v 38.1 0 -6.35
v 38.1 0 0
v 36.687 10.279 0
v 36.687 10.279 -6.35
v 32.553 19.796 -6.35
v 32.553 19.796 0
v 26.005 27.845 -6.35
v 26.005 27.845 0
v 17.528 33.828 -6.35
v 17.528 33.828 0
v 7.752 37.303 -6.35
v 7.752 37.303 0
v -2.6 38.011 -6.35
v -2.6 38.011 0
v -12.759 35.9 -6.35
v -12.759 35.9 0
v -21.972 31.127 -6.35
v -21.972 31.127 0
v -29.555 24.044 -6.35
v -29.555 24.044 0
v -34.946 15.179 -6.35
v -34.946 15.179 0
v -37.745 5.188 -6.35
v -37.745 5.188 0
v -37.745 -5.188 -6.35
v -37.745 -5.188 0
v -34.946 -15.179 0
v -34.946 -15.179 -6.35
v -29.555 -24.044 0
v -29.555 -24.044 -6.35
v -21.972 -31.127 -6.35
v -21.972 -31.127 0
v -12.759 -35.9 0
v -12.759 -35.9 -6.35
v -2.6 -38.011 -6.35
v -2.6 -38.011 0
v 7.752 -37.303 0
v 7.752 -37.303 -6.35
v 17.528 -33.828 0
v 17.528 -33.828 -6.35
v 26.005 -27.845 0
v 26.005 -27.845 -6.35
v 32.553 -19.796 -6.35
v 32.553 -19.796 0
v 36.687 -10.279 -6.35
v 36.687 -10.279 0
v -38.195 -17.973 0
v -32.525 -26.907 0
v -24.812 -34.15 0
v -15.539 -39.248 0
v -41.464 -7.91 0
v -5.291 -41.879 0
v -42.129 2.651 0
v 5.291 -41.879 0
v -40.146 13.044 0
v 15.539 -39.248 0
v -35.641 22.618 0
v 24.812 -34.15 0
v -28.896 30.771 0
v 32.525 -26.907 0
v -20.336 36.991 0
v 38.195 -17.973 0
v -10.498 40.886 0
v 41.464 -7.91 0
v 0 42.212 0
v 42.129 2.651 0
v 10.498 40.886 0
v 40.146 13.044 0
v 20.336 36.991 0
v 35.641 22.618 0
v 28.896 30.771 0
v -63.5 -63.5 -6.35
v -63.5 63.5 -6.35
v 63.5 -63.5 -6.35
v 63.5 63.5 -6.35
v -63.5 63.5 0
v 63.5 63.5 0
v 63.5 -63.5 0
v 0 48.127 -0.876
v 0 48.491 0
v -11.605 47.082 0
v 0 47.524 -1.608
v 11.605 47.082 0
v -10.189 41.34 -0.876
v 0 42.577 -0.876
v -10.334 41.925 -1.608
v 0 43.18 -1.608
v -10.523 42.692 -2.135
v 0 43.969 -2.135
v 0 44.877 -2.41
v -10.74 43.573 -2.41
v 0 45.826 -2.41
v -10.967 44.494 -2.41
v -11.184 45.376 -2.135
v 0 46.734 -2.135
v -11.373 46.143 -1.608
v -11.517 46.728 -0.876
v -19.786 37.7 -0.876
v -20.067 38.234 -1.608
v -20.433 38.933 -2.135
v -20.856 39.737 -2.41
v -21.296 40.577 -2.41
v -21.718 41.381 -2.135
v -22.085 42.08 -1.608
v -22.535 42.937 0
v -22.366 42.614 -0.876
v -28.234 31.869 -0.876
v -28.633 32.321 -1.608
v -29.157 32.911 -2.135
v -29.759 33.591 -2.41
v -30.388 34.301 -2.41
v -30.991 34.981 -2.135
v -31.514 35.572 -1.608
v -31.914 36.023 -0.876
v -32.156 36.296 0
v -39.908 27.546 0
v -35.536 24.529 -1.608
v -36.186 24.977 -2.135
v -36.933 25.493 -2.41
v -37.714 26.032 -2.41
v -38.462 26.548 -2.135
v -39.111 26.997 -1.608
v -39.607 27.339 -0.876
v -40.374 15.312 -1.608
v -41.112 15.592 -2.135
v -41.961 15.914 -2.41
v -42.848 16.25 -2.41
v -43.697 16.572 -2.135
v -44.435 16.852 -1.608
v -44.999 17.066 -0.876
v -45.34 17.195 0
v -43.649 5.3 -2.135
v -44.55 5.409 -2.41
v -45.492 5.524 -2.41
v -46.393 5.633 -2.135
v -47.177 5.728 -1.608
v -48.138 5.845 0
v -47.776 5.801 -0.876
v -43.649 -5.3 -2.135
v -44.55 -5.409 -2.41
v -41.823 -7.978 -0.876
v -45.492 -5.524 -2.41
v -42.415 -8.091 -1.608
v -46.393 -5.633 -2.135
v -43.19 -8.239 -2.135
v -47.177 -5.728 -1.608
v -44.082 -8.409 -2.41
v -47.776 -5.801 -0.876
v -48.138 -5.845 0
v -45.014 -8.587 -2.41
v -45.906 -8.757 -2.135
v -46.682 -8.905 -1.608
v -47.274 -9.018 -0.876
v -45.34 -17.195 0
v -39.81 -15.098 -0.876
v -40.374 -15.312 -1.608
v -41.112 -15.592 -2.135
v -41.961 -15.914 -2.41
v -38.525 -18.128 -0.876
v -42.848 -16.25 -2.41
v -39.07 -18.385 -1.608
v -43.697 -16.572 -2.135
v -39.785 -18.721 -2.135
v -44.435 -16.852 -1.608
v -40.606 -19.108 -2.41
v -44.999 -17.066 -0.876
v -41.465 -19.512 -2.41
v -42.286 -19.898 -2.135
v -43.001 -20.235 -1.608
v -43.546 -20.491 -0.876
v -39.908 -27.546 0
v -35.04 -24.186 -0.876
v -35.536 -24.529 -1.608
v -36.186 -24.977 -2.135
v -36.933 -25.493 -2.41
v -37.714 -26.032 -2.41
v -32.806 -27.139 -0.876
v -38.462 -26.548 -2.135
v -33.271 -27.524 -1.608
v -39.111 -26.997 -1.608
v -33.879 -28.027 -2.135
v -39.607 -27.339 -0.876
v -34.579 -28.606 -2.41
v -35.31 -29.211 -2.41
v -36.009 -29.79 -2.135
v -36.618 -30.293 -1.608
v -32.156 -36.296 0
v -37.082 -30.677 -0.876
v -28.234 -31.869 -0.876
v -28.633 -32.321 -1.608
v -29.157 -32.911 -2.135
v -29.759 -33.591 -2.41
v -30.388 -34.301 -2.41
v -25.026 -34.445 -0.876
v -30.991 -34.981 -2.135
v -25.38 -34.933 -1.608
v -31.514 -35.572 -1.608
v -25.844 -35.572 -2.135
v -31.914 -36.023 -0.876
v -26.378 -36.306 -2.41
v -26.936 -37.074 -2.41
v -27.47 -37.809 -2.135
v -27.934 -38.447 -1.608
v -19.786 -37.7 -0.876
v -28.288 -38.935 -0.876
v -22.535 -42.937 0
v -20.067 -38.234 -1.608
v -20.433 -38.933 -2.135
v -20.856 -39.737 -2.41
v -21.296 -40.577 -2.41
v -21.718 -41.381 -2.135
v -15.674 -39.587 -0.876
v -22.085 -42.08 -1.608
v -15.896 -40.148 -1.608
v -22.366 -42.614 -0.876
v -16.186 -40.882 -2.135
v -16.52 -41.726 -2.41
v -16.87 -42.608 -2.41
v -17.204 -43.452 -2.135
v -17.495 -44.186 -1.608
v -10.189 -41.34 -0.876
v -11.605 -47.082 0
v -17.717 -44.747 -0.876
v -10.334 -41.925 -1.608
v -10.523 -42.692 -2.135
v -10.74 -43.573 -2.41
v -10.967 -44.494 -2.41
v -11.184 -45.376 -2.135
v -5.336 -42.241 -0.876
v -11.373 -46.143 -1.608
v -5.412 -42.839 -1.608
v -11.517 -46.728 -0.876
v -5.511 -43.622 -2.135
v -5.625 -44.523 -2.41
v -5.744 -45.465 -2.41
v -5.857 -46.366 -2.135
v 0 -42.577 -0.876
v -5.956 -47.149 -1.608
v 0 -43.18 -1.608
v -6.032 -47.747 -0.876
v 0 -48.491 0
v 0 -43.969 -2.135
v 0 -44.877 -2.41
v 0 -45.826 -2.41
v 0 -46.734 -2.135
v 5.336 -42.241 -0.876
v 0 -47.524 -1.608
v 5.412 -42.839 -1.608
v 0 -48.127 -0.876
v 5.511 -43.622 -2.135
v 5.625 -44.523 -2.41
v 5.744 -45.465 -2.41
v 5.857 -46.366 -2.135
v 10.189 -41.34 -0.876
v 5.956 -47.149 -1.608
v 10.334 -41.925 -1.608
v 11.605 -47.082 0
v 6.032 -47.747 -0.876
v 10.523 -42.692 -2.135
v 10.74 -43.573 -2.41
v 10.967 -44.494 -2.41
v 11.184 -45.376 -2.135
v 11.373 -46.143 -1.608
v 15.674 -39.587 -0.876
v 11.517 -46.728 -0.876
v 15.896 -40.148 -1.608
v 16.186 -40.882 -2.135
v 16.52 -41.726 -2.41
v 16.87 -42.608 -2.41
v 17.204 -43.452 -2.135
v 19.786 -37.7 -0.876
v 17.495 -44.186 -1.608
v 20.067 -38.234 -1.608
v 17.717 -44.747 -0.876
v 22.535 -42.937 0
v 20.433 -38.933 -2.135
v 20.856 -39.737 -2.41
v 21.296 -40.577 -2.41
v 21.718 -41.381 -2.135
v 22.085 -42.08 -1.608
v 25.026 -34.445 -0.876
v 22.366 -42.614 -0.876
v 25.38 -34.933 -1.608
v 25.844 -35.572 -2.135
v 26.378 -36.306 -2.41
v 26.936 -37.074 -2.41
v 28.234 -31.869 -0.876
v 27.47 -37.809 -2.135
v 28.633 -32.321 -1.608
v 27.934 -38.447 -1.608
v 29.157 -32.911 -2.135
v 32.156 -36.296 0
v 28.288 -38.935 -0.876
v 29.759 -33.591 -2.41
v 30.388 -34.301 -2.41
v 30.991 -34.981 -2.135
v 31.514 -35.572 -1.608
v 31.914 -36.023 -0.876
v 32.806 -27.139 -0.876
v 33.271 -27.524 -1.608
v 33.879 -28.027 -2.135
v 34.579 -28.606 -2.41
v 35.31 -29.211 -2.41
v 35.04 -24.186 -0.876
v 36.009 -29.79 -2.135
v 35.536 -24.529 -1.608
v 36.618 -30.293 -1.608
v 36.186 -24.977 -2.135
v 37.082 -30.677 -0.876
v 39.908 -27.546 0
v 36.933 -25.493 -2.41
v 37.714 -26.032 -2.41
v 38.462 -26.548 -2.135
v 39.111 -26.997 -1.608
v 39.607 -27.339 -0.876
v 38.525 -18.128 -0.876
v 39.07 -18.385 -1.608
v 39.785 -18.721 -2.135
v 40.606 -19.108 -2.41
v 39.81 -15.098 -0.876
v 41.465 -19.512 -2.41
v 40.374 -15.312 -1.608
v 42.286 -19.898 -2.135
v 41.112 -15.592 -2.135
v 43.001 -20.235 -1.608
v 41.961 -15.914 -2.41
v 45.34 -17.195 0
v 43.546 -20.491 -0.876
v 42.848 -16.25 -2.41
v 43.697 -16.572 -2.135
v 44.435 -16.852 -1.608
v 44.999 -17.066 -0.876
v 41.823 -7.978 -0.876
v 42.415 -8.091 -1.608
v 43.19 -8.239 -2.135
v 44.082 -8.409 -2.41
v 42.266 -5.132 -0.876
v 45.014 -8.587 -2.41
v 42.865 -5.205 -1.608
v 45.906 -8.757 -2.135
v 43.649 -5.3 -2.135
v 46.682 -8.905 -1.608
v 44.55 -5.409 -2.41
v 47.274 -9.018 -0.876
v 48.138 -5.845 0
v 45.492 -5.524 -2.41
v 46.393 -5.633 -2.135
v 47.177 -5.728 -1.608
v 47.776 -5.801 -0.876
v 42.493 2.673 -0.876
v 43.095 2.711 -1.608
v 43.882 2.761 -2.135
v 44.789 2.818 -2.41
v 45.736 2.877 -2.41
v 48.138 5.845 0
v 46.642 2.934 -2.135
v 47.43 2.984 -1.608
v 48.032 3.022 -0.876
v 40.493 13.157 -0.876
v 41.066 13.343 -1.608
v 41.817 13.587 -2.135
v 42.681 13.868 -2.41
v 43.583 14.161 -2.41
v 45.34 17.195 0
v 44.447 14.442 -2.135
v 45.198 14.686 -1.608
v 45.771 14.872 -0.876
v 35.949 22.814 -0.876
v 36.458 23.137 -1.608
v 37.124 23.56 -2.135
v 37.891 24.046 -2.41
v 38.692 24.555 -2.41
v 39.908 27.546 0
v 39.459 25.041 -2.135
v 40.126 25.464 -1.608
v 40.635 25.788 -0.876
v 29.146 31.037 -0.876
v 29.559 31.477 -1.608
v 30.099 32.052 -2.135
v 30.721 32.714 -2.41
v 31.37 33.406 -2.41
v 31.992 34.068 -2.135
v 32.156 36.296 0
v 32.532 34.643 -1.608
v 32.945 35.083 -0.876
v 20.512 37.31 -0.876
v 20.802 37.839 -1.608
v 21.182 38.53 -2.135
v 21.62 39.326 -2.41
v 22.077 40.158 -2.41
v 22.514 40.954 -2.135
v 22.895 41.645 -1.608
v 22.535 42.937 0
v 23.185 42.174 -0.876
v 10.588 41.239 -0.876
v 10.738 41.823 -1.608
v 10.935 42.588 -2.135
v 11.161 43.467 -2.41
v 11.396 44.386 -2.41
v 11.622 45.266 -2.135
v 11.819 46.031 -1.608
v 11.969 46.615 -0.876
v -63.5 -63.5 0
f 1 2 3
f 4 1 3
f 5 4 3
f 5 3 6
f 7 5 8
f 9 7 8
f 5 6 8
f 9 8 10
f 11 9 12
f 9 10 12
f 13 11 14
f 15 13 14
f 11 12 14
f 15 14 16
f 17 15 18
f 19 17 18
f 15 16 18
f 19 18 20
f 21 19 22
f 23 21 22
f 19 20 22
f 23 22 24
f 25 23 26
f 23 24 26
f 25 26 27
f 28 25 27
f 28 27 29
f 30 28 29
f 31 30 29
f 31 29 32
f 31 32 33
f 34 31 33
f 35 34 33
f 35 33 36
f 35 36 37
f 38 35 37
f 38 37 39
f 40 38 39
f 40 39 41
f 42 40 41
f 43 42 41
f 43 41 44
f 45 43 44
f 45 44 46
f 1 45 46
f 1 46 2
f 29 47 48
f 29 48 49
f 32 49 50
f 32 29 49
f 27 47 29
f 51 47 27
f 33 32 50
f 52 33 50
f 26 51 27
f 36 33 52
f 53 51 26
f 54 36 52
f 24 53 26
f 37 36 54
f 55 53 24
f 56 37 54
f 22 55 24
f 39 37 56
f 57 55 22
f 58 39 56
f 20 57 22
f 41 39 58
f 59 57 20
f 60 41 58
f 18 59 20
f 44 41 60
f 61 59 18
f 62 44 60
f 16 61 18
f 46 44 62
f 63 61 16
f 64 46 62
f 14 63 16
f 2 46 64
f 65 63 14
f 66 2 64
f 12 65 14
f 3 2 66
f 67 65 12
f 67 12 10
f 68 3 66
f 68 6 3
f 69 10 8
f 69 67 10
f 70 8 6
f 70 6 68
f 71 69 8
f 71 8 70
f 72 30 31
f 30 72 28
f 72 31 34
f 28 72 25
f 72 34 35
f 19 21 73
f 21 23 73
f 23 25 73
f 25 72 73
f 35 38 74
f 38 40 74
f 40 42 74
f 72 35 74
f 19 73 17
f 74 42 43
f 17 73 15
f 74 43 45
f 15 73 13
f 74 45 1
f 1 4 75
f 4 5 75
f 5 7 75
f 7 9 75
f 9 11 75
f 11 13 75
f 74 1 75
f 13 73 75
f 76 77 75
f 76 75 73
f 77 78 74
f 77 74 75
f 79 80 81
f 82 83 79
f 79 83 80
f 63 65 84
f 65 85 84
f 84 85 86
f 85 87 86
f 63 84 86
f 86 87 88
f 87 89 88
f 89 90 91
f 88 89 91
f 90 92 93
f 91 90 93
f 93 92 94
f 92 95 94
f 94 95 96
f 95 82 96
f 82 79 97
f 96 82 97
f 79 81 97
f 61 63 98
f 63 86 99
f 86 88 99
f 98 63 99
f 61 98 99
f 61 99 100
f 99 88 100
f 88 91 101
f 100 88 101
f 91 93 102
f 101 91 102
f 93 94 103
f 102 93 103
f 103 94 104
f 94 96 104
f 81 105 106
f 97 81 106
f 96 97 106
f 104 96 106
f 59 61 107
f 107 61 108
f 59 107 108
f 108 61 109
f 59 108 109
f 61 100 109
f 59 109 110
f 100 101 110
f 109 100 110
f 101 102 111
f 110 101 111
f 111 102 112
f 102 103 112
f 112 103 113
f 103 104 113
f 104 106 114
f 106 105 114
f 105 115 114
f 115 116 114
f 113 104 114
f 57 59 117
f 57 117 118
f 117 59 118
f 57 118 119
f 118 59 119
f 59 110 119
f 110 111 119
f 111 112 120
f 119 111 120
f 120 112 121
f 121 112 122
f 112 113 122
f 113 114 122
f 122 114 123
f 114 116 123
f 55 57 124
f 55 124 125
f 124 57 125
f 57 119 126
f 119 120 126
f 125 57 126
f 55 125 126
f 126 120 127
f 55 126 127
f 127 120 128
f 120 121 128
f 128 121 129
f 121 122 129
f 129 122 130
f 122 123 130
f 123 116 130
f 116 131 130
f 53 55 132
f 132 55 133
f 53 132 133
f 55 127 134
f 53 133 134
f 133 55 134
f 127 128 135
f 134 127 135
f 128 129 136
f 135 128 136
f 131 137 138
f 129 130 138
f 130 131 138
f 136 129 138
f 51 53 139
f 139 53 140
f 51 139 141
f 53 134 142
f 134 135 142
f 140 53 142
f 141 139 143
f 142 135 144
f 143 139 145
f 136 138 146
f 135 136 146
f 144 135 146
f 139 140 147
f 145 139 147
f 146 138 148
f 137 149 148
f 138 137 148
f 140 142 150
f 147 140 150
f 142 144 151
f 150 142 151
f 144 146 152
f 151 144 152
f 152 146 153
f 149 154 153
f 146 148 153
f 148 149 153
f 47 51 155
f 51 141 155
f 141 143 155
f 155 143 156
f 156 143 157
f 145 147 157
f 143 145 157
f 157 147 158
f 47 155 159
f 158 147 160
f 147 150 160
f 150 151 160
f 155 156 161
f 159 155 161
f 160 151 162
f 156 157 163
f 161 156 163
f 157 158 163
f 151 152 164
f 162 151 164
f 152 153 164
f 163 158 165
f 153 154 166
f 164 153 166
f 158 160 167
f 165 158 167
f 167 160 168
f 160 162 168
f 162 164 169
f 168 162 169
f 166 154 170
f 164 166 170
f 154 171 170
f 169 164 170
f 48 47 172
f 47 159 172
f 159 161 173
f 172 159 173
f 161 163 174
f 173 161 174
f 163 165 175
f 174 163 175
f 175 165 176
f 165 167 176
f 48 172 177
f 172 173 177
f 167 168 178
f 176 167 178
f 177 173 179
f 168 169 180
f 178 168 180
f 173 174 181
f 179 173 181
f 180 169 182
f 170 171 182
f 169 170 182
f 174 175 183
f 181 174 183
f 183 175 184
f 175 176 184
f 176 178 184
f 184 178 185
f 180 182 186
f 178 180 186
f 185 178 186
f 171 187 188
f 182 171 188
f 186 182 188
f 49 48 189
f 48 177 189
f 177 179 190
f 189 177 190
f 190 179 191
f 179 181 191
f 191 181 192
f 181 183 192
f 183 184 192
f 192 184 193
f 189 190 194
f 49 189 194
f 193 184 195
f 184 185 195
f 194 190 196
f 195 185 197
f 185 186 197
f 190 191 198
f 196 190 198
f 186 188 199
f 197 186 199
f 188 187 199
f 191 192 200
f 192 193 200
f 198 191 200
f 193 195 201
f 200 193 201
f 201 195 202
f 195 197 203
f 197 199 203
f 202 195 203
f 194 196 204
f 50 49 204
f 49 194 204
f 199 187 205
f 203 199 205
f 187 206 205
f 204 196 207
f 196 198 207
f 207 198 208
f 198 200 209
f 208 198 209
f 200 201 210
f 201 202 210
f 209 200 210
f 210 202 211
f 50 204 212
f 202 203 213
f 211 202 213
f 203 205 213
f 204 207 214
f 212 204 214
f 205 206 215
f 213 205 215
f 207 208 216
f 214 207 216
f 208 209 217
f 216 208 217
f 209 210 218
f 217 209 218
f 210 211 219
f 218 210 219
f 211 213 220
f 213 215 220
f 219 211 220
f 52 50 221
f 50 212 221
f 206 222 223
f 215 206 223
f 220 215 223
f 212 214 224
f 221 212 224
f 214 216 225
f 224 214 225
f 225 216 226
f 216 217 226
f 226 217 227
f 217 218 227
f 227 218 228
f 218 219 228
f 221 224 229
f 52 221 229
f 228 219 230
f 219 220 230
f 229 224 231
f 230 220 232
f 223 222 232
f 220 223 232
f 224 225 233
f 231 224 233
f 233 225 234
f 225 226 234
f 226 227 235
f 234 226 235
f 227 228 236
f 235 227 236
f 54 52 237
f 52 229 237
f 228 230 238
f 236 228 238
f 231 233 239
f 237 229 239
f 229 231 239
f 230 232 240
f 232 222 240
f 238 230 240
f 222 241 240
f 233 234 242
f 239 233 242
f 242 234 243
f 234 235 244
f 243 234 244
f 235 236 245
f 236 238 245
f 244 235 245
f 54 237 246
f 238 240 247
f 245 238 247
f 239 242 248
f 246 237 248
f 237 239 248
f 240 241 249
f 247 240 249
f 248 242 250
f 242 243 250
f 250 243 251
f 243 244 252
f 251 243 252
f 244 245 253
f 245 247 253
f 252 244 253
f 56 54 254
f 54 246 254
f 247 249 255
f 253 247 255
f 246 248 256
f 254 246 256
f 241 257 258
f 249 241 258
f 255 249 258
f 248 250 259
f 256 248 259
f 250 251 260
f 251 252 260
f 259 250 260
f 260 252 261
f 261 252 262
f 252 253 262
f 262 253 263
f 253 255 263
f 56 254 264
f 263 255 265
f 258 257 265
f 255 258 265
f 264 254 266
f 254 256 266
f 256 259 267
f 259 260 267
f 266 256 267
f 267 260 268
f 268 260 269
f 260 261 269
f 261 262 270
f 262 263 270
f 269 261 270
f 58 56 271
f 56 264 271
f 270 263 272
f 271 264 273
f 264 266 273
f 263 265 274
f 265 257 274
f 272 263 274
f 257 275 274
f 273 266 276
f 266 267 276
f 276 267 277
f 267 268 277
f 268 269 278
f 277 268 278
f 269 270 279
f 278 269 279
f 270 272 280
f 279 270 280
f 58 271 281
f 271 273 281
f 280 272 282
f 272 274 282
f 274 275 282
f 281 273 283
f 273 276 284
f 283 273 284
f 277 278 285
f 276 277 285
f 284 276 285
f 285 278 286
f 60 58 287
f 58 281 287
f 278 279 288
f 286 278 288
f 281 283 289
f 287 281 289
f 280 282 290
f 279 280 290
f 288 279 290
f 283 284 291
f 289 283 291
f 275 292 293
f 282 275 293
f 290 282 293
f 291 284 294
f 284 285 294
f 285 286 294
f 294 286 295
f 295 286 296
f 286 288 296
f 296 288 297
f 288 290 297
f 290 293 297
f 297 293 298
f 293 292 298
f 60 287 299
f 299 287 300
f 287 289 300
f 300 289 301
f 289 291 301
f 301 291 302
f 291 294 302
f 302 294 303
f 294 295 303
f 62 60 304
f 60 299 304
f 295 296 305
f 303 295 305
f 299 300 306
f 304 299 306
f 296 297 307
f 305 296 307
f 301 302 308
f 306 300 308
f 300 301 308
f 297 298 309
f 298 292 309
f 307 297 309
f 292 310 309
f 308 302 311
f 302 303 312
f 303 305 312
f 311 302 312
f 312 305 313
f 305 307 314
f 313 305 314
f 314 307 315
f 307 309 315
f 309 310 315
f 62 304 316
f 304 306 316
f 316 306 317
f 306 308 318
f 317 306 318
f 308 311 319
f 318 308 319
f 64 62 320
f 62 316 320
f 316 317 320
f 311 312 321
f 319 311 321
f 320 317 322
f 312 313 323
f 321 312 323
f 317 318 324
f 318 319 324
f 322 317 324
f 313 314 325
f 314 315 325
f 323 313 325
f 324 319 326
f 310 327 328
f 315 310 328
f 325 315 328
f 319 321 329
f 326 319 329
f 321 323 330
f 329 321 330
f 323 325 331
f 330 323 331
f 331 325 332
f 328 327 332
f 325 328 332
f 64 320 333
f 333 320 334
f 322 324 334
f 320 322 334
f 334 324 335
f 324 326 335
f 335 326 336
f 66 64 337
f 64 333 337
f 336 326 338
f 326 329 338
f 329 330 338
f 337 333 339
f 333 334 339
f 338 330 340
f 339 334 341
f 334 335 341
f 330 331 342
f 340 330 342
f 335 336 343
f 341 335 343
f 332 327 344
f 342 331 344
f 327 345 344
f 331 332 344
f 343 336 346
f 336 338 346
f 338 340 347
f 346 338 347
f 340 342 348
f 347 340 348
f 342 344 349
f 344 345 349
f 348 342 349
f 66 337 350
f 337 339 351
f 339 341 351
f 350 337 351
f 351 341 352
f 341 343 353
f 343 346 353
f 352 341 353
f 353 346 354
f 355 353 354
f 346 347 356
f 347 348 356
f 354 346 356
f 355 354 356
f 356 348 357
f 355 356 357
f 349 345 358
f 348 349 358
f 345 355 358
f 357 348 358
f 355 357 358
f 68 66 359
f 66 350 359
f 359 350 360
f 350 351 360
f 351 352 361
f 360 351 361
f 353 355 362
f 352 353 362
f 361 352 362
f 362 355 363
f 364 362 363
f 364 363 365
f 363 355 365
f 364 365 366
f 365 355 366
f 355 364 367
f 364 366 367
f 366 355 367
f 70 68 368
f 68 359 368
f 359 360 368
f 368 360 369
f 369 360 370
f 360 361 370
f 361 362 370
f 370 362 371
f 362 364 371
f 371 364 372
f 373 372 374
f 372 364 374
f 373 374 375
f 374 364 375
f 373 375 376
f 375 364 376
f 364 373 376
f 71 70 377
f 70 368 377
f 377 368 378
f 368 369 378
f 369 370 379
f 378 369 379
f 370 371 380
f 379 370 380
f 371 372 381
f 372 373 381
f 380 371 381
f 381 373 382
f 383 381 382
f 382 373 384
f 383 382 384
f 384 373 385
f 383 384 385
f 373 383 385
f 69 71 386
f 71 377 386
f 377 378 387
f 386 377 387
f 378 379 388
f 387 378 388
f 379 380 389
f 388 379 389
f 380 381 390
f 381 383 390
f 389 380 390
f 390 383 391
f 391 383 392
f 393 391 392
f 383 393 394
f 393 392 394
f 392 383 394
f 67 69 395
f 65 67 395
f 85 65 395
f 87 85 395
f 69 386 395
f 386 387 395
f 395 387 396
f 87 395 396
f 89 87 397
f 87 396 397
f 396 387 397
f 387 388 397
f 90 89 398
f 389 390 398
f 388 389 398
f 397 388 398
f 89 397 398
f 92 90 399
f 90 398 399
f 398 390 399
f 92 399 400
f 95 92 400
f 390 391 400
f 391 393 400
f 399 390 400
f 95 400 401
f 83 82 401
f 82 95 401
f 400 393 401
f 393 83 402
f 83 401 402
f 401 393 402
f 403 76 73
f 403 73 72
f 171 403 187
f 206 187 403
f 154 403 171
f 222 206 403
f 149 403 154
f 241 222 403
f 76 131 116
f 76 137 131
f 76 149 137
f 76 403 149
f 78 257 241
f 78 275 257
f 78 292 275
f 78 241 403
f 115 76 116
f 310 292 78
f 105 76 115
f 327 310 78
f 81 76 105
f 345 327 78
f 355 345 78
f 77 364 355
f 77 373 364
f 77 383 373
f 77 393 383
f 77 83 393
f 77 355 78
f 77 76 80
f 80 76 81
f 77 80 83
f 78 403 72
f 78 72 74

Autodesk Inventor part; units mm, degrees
ref_plane "YZ Plane" through (0, 0, 0) normal (1, 0, 0) x (0, 1, 0)
ref_plane "XZ Plane" through (0, 0, 0) normal (0, 1, 0) x (-1, 0, 0)
ref_plane "XY Plane" through (0, 0, 0) normal (0, 0, 1) x (1, 0, 0)
sketch "Sketch1" plane through (0, 0, 0) normal (0, 0, 1) x (1, 0, 0)
  circle A0 centre (0, 0) radius 48.5902 construction
  circle A1 centre (0, 0) radius 42.1132 construction
  circle A2 centre (0, 0) radius 54.61 construction
  circle A3 centre (0, 0) radius 51.7652 construction
  line L0 (0, 0) -> (0, 45.3517) construction
  circle A4 centre (0, 0) radius 38.1
  line L1 (-63.5, -63.5) -> (63.5, -63.5)
  line L2 (63.5, -63.5) -> (63.5, 63.5)
  line L3 (63.5, 63.5) -> (-63.5, 63.5)
  line L4 (-63.5, 63.5) -> (-63.5, -63.5)
  line L5 (-63.5, -63.5) -> (63.5, 63.5) construction
  line L6 (63.5, -63.5) -> (-63.5, 63.5) construction
  dimension "d0" = 97.1804
  dimension "d1" = 84.2264
  dimension "d2" = 109.22
  dimension "d3" = 103.5304
  dimension "d15" = 45.3517
  dimension "d27" = 76.2
  dimension "d28" = 127
  dimension "d29" = 127
sketch "Sketch2" plane through (0, 0, 0) normal (1, 0, 0) x (0, 1, 0)
  line L0 (0, 0) -> (45.3517, 0) construction
  line L1 (45.3517, 0) -> (45.3517, 0.7937) construction
  circle A0 centre (45.3517, 0.7937) radius 3.2385
  line L2 (0, 0) -> (0, 25.4) construction
  dimension "d16" = 6.477
  dimension "d17" = 0.7937
  dimension "d18" = 25.4
extrude "Extrusion2" add sketch "Sketch1" against normal blind 6.35
revolve "Revolution2" cut sketch "Sketch2" angle 360 about axis through (0, 0, 0) along (0, 0, 1)
equation "\"d15\" = 0.25 * d1 + 0.25 * d0"
properties part number "Upper Plate" material "Aluminum 6061"
